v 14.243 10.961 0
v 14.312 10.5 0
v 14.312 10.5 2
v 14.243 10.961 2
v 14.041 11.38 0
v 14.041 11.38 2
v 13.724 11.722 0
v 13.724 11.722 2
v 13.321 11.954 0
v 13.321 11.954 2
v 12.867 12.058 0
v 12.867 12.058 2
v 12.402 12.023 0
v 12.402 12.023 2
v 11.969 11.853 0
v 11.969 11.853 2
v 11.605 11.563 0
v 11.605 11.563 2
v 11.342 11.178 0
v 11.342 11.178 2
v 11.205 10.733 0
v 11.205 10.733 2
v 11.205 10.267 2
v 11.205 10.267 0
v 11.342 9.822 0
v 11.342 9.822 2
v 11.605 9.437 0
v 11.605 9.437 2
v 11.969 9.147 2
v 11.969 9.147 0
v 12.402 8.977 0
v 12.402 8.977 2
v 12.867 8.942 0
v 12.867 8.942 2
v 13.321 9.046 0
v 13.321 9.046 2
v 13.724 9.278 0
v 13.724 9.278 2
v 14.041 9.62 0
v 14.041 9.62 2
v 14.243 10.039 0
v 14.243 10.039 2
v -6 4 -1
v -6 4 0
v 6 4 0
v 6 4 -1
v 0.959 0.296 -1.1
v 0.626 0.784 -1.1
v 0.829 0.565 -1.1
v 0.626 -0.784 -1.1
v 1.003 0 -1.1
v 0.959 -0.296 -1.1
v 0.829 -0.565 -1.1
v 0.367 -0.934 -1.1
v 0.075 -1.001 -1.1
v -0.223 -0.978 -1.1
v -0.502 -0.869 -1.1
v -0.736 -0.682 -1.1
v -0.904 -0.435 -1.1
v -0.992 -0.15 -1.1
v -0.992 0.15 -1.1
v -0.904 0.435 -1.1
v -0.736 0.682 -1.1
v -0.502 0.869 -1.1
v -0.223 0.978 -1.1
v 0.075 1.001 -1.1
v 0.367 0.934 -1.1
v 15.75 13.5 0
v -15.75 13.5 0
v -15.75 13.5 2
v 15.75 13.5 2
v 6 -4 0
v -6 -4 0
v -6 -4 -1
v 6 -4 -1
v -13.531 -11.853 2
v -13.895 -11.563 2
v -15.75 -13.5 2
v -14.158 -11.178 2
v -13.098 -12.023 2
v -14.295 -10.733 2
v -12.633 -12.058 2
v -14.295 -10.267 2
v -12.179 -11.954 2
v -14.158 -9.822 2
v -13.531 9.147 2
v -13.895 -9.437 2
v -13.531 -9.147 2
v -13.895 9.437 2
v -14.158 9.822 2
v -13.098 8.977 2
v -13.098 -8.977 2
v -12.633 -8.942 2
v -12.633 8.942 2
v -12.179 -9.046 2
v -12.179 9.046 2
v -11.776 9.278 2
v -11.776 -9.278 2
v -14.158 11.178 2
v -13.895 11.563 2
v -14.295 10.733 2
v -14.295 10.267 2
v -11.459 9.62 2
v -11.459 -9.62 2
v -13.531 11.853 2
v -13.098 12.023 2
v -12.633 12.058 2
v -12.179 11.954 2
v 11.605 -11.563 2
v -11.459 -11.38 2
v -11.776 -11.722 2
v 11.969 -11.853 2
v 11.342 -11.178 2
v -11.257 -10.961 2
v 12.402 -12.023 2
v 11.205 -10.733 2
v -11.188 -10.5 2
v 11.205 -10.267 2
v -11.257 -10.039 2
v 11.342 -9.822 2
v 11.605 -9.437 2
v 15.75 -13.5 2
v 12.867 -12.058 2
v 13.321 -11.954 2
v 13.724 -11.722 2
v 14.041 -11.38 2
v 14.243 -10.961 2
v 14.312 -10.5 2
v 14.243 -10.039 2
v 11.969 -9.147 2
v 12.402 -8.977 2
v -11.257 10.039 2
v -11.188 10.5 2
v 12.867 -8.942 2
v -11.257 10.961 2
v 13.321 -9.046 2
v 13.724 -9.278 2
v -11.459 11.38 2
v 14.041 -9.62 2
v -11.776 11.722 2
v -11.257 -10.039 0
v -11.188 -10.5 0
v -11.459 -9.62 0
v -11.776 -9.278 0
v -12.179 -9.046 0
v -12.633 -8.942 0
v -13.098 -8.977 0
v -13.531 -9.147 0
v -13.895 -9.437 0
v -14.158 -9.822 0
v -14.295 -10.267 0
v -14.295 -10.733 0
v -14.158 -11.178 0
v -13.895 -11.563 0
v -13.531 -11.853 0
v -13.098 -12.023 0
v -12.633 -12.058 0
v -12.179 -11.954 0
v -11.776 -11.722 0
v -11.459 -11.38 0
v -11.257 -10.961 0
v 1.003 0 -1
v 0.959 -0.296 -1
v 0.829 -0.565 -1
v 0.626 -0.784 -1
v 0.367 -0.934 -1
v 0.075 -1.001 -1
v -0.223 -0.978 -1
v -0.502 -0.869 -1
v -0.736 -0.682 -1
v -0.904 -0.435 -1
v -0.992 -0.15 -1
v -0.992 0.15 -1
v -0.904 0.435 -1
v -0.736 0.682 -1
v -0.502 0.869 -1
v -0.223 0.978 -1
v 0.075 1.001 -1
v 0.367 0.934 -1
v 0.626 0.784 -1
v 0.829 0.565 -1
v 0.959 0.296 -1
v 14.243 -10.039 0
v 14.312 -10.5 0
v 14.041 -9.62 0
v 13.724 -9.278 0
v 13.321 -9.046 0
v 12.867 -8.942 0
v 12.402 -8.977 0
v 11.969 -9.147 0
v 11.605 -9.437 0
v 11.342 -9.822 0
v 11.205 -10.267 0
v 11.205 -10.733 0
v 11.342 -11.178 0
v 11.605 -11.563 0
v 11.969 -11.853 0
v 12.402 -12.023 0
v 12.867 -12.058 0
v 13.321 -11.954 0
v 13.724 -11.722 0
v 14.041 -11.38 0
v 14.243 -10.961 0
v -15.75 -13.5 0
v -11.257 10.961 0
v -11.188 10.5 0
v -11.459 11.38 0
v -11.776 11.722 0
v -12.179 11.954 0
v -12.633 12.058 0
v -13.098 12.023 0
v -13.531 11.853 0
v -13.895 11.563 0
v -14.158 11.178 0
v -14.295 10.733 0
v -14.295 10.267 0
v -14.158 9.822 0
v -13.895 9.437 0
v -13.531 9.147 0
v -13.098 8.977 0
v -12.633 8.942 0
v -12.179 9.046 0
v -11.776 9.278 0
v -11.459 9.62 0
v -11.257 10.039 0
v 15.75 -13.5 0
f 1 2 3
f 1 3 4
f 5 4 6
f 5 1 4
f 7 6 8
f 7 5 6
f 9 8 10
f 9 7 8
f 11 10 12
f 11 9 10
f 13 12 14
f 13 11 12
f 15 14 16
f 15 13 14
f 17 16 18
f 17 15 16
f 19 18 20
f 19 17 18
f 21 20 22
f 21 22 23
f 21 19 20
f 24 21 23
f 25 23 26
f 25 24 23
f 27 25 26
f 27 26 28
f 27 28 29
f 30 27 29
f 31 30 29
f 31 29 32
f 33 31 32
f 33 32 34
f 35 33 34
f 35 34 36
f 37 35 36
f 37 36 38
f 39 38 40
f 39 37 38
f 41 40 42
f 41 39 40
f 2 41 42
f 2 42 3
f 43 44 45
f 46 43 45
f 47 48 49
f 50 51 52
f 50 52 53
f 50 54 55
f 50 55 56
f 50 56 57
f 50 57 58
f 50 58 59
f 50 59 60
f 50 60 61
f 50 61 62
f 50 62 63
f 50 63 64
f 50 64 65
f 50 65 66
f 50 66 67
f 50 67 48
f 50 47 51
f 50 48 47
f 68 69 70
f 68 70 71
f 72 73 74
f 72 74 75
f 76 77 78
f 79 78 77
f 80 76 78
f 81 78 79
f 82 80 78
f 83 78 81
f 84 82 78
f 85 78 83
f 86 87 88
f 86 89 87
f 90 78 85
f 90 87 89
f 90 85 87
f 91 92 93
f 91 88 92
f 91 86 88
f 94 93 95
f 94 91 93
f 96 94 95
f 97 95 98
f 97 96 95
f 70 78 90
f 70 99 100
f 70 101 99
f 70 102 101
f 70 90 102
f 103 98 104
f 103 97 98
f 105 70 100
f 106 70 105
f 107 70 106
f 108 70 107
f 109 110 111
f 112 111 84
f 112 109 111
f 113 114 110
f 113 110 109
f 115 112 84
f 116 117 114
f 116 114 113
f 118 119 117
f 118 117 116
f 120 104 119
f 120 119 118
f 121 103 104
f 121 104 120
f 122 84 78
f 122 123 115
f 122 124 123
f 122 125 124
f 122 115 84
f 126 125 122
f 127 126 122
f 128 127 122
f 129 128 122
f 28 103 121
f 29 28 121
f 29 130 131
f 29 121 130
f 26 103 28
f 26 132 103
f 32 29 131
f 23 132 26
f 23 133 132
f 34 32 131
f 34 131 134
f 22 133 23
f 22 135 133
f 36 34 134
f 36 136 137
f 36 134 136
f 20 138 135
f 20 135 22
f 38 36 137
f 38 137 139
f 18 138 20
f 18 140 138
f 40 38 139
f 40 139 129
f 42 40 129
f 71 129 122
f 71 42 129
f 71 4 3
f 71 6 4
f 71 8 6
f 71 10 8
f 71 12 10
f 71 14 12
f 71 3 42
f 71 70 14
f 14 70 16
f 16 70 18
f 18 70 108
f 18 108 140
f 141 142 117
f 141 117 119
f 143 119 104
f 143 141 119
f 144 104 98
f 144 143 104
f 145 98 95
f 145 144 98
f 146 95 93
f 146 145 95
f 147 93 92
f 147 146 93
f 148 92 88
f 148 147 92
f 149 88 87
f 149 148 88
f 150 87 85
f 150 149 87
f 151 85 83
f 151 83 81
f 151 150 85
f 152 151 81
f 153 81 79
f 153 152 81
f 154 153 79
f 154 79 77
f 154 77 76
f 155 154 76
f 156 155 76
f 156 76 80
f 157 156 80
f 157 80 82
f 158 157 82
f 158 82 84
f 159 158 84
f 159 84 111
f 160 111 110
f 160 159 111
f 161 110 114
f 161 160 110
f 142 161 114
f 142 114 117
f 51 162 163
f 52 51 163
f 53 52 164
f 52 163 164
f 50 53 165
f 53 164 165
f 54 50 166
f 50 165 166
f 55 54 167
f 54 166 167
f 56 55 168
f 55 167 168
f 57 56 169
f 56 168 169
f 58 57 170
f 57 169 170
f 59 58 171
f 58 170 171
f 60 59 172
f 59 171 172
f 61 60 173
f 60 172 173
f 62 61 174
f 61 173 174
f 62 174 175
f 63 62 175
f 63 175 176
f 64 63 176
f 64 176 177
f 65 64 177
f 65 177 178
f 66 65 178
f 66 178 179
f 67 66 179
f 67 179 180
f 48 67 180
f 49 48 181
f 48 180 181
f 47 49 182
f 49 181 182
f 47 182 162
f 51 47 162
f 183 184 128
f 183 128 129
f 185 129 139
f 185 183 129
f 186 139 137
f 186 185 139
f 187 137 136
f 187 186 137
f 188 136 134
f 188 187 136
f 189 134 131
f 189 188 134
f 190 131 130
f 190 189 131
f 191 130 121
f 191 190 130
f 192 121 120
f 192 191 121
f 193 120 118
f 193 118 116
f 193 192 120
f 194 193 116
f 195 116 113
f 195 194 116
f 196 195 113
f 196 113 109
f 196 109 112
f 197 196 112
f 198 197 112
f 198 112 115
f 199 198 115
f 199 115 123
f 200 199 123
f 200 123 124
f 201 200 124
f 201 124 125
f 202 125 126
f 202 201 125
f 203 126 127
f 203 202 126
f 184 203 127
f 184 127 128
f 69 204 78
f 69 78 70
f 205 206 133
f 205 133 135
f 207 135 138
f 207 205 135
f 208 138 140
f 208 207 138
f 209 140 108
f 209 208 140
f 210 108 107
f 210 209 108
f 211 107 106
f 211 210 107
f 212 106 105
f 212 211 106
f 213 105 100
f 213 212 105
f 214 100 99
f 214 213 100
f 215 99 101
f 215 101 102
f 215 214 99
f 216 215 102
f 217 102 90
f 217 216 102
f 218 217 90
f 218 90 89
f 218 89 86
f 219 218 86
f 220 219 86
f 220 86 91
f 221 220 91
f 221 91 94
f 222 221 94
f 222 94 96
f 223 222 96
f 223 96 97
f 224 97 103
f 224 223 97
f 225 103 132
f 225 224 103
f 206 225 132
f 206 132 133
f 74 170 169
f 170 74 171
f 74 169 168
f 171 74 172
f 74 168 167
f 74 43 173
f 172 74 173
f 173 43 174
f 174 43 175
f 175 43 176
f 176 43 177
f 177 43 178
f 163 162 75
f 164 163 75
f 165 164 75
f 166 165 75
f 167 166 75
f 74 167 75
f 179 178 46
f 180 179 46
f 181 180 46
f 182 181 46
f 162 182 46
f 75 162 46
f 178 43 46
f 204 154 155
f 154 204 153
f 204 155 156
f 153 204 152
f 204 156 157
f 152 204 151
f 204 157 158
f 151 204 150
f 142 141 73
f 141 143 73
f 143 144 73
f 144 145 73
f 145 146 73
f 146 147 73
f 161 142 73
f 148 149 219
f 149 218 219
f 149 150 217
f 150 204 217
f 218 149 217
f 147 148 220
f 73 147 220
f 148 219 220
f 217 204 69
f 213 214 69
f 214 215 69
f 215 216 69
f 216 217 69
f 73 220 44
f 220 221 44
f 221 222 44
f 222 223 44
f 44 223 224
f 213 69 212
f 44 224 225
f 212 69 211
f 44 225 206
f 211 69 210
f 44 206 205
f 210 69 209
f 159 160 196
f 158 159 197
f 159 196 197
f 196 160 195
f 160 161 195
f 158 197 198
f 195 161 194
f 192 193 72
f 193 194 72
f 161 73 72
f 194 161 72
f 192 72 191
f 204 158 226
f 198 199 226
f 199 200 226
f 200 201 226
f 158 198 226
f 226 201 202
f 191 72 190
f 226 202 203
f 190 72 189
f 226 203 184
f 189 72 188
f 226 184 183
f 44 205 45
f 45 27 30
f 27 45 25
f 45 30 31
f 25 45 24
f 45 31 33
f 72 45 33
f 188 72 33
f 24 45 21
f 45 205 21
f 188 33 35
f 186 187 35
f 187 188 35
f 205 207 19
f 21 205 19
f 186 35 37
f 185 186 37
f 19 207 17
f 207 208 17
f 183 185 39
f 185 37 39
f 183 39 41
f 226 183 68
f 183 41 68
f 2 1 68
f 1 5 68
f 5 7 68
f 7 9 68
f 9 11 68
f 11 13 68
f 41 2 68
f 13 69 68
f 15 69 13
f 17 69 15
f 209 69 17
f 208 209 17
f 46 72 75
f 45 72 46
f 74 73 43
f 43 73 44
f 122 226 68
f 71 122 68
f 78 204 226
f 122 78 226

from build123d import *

# Parameters (mm, degrees)
SKETCH1_W           = 31.5
SKETCH1_H           = 27
SKETCH1_R           = 1.5625
BOSS_EXTRUDE1_DEPTH = 2
SKETCH1_3_W         = 12
SKETCH1_3_H         = 8
BOSS_EXTRUDE2_DEPTH = 1
SKETCH2_R           = 1.003384187
BOSS_EXTRUDE3_DEPTH = 0.1


with BuildPart() as part:
    # Sketch1 → Boss-Extrude1 (new body)
    with BuildSketch(Plane.XY):
        Rectangle(SKETCH1_W, SKETCH1_H)
        with Locations((-12.75, -10.5)):
            Circle(SKETCH1_R, mode=Mode.SUBTRACT)
        with Locations((12.75, -10.5)):
            Circle(SKETCH1_R, mode=Mode.SUBTRACT)
        with Locations((-12.75, 10.5)):
            Circle(SKETCH1_R, mode=Mode.SUBTRACT)
        with Locations((12.75, 10.5)):
            Circle(SKETCH1_R, mode=Mode.SUBTRACT)
    extrude(amount=BOSS_EXTRUDE1_DEPTH)

    # Sketch1<3> → Boss-Extrude2 (add)
    with BuildSketch(Plane.XY):
        Rectangle(SKETCH1_3_W, SKETCH1_3_H)
    extrude(amount=-BOSS_EXTRUDE2_DEPTH)

    # Sketch2 → Boss-Extrude3 (add)
    with BuildSketch(Plane(origin=(0, 0, -1), x_dir=(-1, 0, 0), z_dir=(0, 0, -1))):
        Circle(SKETCH2_R)
    extrude(amount=BOSS_EXTRUDE3_DEPTH)


solid = part.part
